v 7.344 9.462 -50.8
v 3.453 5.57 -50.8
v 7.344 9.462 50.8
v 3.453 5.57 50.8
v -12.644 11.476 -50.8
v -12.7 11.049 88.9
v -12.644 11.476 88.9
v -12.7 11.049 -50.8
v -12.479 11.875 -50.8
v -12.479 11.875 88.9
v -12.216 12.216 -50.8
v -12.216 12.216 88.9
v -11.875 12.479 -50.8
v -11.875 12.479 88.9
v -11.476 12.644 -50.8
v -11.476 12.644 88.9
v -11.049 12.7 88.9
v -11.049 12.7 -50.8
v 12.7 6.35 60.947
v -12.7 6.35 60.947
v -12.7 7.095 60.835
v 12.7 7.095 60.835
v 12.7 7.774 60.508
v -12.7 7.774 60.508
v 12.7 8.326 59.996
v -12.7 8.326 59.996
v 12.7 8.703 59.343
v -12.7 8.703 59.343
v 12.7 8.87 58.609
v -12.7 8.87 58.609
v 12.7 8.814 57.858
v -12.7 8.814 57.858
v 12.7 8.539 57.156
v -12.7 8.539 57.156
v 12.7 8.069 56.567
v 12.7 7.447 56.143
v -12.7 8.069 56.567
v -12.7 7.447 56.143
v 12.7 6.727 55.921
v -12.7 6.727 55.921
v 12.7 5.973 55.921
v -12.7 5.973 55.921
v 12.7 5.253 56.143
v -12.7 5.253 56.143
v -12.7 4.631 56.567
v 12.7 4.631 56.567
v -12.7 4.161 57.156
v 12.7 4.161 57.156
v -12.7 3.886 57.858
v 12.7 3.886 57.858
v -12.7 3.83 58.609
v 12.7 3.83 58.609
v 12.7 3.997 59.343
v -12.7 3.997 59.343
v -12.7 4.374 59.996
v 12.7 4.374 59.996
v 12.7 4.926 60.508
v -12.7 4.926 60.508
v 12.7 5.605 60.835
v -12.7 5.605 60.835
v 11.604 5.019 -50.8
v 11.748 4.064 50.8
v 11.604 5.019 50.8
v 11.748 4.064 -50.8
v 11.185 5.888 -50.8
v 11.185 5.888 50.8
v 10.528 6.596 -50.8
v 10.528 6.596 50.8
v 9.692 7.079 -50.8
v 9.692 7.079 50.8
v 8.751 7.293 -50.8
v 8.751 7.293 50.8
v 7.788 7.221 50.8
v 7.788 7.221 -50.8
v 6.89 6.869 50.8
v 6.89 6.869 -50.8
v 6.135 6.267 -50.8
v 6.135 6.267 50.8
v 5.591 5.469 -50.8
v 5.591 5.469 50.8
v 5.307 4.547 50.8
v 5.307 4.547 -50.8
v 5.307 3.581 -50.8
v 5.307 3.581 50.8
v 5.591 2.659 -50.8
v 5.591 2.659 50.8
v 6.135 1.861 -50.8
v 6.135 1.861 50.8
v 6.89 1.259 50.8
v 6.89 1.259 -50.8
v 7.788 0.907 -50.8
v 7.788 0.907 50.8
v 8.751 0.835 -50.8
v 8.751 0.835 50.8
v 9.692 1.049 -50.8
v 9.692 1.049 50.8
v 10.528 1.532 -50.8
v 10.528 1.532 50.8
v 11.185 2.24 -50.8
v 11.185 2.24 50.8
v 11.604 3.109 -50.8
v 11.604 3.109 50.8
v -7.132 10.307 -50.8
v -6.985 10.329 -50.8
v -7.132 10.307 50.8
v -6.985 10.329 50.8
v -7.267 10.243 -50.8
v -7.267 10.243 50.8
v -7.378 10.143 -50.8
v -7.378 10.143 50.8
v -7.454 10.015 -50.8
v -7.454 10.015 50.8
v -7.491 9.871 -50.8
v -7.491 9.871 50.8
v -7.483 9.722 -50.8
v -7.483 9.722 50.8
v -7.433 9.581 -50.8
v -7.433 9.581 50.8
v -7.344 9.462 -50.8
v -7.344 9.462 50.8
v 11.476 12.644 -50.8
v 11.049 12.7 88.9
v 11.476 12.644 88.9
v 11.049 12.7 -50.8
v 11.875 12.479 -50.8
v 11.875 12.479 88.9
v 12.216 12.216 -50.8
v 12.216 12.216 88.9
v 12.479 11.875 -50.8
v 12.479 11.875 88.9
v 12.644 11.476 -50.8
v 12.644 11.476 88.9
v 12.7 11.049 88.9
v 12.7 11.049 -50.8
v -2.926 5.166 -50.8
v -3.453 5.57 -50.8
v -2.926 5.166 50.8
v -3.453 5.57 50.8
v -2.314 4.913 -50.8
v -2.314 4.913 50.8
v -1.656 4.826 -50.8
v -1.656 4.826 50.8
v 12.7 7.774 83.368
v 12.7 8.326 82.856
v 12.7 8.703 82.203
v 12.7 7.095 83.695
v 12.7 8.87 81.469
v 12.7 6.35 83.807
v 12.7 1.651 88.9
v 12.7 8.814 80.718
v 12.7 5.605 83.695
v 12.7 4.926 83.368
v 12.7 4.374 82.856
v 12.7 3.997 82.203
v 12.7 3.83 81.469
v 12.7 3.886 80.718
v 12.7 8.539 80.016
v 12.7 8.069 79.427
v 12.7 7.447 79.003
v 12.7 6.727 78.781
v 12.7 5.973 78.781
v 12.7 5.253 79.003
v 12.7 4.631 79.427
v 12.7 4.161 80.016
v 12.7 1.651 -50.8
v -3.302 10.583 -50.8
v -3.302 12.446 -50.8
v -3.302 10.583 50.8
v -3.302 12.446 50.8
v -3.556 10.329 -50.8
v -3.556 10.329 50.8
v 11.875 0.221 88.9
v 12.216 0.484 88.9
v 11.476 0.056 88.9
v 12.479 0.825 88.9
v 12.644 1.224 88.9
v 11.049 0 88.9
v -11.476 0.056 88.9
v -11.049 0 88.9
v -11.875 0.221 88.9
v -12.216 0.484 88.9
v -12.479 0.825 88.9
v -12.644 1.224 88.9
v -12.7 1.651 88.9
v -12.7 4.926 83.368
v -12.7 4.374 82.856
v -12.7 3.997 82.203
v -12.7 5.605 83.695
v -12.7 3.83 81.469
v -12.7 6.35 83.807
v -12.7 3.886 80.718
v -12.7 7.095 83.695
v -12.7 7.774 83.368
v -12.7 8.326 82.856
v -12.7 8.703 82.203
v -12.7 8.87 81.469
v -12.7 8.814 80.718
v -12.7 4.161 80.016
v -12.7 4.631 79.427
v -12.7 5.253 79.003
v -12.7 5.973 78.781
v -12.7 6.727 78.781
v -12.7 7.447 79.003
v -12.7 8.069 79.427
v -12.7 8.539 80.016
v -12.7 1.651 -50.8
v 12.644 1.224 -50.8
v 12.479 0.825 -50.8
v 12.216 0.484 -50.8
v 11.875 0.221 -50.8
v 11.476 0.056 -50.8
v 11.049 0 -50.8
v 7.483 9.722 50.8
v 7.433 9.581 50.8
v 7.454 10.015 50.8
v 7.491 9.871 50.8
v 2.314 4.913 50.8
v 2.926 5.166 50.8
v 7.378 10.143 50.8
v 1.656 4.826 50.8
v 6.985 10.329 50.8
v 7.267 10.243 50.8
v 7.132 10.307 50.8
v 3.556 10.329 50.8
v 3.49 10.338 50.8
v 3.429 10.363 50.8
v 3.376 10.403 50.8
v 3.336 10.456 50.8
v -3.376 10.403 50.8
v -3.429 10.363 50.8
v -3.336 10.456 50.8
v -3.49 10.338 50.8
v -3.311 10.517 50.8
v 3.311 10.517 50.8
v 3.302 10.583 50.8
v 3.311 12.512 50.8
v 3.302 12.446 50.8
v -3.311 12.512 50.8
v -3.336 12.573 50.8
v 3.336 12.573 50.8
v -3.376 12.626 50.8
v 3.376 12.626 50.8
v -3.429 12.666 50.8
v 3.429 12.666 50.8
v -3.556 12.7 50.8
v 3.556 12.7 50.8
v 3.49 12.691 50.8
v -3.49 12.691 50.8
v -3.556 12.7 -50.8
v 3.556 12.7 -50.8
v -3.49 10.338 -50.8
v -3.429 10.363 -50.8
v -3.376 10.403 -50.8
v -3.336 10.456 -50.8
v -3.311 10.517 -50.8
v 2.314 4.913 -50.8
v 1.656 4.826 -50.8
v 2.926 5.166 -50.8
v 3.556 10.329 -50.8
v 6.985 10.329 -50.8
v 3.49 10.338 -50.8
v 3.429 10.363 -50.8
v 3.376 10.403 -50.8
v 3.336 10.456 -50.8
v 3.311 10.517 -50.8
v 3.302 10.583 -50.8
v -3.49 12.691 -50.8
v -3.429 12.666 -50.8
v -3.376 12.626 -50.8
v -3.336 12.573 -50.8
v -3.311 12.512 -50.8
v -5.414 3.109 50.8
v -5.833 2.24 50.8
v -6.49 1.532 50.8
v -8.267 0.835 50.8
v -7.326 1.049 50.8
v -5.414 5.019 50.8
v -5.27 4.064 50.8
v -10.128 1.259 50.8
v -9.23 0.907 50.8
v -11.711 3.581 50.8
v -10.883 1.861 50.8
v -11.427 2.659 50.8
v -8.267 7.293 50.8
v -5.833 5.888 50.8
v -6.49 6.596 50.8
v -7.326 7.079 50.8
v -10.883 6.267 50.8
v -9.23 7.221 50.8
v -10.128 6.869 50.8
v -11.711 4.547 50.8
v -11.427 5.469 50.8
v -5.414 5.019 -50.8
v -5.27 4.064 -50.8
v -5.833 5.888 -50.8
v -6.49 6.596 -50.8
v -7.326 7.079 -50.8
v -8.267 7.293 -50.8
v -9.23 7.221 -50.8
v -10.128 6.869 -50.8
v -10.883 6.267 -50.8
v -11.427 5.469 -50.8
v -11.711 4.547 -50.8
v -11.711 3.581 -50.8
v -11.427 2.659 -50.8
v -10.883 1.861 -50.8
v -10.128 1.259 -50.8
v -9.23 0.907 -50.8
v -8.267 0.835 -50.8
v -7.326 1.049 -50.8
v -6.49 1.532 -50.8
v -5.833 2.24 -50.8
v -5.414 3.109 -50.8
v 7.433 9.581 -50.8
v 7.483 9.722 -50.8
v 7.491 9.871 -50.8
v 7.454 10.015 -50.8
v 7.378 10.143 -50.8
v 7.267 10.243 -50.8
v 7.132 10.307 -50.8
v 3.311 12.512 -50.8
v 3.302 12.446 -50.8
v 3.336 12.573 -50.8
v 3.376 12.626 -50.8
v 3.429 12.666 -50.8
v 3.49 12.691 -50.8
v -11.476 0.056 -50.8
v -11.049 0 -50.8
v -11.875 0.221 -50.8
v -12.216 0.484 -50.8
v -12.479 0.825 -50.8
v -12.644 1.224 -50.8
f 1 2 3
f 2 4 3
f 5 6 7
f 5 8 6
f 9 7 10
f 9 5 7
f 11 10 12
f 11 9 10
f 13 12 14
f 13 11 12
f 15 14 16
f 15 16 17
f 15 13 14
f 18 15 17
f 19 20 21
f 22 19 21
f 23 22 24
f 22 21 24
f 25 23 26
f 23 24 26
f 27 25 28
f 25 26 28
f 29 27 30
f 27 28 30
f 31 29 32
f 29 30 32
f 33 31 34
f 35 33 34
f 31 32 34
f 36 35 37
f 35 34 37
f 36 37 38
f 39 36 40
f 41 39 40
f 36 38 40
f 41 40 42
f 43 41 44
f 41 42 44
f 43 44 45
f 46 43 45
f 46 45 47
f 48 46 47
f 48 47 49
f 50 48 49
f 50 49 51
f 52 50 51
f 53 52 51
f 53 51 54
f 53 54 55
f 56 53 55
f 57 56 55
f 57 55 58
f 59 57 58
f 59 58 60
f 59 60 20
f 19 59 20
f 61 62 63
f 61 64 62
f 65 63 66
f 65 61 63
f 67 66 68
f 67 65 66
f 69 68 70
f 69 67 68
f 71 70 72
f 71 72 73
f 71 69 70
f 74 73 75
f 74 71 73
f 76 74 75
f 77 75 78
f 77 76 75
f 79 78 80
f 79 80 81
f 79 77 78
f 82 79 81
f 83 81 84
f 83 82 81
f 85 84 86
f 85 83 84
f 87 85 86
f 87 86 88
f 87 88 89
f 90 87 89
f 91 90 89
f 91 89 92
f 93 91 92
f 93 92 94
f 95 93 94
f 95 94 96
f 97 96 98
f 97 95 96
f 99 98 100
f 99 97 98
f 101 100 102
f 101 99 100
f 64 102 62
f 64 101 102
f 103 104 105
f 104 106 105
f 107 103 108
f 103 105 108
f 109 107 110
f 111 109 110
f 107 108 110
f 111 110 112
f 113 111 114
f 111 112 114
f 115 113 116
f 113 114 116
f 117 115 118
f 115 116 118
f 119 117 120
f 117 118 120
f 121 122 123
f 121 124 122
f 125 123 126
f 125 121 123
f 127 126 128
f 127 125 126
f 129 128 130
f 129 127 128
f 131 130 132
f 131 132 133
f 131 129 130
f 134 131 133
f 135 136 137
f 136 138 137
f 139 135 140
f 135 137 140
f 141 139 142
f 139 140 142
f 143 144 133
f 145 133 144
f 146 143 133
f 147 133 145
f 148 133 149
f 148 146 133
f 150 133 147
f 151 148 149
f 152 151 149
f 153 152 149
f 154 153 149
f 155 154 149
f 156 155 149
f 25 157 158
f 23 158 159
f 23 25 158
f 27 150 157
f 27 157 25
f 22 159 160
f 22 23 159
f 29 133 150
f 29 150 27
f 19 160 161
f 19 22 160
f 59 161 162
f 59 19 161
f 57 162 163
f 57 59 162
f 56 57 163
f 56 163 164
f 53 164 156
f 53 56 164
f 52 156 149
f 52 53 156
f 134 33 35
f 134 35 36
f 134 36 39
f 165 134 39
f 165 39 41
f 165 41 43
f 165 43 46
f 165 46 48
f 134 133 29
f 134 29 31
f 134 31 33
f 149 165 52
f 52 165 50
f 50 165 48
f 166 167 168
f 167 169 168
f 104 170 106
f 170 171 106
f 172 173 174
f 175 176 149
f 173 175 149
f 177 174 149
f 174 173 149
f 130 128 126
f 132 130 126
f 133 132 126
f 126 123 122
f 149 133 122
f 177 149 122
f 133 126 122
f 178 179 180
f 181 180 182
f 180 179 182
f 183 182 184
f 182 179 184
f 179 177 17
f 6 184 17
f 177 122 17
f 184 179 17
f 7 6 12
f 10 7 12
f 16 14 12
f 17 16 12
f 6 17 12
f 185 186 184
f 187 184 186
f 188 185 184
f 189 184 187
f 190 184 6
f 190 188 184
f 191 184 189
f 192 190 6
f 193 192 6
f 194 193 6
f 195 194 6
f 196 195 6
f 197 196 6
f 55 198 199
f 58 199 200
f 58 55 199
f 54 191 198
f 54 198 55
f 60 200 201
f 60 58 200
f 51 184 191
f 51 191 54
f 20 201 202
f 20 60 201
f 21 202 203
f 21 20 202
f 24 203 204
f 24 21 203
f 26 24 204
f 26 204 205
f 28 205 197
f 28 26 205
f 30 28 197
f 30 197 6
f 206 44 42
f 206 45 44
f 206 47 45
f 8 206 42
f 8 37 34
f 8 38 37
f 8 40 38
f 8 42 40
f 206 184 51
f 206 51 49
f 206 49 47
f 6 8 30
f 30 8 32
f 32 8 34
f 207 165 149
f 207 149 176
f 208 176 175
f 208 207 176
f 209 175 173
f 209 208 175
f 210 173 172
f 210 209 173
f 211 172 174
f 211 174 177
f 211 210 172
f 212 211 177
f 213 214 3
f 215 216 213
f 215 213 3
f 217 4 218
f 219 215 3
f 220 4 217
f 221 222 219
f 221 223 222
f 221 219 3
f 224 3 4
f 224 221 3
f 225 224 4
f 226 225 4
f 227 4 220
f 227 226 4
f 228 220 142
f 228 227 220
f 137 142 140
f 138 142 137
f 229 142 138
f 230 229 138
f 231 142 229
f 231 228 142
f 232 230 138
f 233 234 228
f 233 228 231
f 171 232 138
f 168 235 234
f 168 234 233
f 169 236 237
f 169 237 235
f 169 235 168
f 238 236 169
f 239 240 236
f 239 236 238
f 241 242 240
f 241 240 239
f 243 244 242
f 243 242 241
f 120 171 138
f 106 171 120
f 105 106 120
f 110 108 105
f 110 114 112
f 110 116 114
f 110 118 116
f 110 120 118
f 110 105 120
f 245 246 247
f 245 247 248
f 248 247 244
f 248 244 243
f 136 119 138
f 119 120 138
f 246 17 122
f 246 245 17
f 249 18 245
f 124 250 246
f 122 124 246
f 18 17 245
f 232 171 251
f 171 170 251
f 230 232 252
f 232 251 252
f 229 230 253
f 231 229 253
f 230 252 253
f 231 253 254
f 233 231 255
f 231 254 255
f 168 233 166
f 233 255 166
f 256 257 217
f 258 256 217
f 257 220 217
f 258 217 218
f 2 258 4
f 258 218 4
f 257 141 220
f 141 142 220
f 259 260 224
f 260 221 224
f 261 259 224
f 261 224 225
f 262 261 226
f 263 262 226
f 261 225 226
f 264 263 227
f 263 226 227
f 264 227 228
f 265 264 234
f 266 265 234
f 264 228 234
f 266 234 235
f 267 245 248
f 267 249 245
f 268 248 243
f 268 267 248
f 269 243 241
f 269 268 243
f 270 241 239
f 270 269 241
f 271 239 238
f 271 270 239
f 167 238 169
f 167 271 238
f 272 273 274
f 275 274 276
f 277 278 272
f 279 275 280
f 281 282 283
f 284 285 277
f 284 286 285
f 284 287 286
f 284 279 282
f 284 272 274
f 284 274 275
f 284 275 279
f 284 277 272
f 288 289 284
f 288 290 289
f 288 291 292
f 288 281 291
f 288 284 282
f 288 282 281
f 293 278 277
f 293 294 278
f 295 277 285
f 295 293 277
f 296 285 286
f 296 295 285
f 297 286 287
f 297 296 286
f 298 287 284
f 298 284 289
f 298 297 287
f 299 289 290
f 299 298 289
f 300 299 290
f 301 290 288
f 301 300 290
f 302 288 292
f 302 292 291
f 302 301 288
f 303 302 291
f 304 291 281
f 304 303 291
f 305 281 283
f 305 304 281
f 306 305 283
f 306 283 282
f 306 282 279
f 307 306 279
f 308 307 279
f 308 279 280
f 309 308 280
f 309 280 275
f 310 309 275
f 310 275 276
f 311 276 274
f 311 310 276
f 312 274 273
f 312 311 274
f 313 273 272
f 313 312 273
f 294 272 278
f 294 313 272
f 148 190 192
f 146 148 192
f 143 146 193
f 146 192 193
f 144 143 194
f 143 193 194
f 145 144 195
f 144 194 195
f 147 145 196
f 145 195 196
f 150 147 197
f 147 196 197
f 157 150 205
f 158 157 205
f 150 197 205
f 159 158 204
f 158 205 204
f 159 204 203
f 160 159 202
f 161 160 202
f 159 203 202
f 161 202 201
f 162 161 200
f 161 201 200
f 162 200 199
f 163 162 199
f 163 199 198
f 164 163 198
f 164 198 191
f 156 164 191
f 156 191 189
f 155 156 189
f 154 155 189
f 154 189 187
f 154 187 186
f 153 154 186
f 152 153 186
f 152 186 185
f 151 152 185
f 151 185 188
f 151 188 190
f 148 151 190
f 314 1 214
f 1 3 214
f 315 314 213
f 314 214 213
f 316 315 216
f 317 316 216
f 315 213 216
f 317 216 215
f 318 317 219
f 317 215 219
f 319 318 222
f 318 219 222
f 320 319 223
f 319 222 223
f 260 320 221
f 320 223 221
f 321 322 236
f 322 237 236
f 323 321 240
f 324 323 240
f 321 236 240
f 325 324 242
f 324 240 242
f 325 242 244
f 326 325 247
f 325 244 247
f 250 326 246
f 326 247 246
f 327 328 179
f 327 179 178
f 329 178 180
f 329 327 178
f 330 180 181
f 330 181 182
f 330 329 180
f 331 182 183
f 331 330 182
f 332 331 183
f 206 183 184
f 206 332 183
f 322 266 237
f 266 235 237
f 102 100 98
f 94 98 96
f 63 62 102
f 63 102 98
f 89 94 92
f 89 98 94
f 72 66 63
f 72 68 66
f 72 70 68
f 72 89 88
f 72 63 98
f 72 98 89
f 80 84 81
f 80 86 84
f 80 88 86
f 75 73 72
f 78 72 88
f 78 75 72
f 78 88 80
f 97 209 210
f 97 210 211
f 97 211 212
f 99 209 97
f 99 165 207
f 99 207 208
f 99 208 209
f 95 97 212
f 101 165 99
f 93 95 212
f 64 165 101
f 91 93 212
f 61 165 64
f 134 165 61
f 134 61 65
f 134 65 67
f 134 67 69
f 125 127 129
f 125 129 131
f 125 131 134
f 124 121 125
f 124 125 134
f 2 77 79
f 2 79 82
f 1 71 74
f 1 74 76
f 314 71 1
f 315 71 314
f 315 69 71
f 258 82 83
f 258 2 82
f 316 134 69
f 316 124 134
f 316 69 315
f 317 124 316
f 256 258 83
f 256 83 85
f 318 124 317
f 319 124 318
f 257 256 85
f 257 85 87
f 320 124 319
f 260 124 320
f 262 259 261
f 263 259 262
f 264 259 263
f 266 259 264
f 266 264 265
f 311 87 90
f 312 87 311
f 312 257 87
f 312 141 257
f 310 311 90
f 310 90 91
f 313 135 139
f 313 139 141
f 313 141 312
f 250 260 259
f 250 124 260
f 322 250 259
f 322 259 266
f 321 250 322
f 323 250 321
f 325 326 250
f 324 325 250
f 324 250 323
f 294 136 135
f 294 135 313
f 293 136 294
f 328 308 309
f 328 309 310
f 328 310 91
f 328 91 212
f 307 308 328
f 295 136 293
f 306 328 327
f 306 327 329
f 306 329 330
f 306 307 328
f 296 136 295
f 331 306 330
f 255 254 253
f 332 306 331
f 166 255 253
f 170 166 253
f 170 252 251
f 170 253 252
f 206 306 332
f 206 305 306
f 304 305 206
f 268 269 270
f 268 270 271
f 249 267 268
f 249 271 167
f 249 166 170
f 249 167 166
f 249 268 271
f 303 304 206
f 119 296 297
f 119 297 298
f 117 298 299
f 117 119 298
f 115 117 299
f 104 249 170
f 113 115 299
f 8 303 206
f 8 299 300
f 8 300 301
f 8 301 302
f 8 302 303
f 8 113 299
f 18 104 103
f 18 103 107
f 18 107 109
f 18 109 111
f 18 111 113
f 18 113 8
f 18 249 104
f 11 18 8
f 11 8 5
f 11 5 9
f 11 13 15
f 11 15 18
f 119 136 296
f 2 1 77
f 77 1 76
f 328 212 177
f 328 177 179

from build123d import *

# Parameters (mm, degrees)
SKETCH3_R                  = 3.2385
BOSS_EXTRUDE1_DEPTH        = 50.8
FILLET1_R                  = 0.254
BOSS_EXTRUDE2_DEPTH        = 38.1
F_8_0_199_DIAMETER_HOLE1_D = 5.0546
LPATTERN1_COUNT            = 2
LPATTERN1_PITCH            = 22.86


with BuildPart() as part:
    # Sketch3 → Boss-Extrude1 (new body, symmetric)
    with BuildSketch(Plane.XY):
        with BuildLine():
            Line((-11.049, 12.7), (-3.302, 12.7))
            Line((-3.302, 12.7), (-3.302, 10.328863887))
            Line((-3.302, 10.328863887), (-6.985, 10.328863887))
            ThreePointArc((-6.985, 10.328863887), (-7.454330803, 10.01526707), (-7.344210245, 9.461653642))
            Line((-7.344210245, 9.461653642), (-3.452505379, 5.569948776))
            ThreePointArc((-3.452505379, 5.569948776), (-2.628470073, 5.019345987), (-1.656454155, 4.826))
            Line((-1.656454155, 4.826), (1.656454155, 4.826))
            ThreePointArc((1.656454155, 4.826), (2.628470073, 5.019345987), (3.452505379, 5.569948776))
            Line((3.452505379, 5.569948776), (7.344210245, 9.461653642))
            ThreePointArc((7.344210245, 9.461653642), (7.454330803, 10.01526707), (6.985, 10.328863887))
            Line((6.985, 10.328863887), (3.302, 10.328863887))
            Line((3.302, 10.328863887), (3.302, 12.7))
            Line((3.302, 12.7), (11.049, 12.7))
            ThreePointArc((11.049, 12.7), (12.216433296, 12.216433296), (12.7, 11.049))
            Line((12.7, 11.049), (12.7, 1.651))
            ThreePointArc((12.7, 1.651), (12.216433296, 0.483566704), (11.049, 0))
            Line((11.049, 0), (-11.049, 0))
            ThreePointArc((-11.049, 0), (-12.216433296, 0.483566704), (-12.7, 1.651))
            Line((-12.7, 1.651), (-12.7, 11.049))
            ThreePointArc((-12.7, 11.049), (-12.216433296, 12.216433296), (-11.049, 12.7))
        make_face()
        with Locations((8.509, 4.064)):
            Circle(SKETCH3_R, mode=Mode.SUBTRACT)
        with Locations((-8.509, 4.064)):
            Circle(SKETCH3_R, mode=Mode.SUBTRACT)
    extrude(amount=BOSS_EXTRUDE1_DEPTH, both=True)

    # Fillet1
    fillet1_edges = [part.edges().sort_by_distance(p)[0] for p in [
        (-3.302, 12.7, 0),
        (-3.302, 10.328863887, 0),
        (3.302, 10.328863887, 0),
        (3.302, 12.7, 0),
    ]]
    fillet(fillet1_edges, radius=FILLET1_R)

    # Sketch4 → Boss-Extrude2 (add)
    with BuildSketch(Plane(origin=(0, 0, 50.8), x_dir=(-1, 0, 0), z_dir=(0, 0, -1))):
        with BuildLine():
            Line((3.556, 12.7), (-11.049, 12.7))
            ThreePointArc((-11.049, 12.7), (-12.216433296, 12.216433296), (-12.7, 11.049))
            Line((-12.7, 11.049), (-12.7, 1.651))
            ThreePointArc((-12.7, 1.651), (-12.216433296, 0.483566704), (-11.049, 0))
            Line((-11.049, 0), (11.049, 0))
            ThreePointArc((11.049, 0), (12.216433296, 0.483566704), (12.7, 1.651))
            Line((12.7, 1.651), (12.7, 11.049))
            ThreePointArc((12.7, 11.049), (12.216433296, 12.216433296), (11.049, 12.7))
            Line((11.049, 12.7), (3.556, 12.7))
        make_face()
    extrude(amount=-BOSS_EXTRUDE2_DEPTH)

    # #8 (0.199) Diameter Hole1 (through all)
    with Locations(Plane(origin=(12.7, 0, 0), x_dir=(0, 0, -1), z_dir=(1, 0, 0))):
        with Locations((-81.28, 6.35)):
            f_8_0_199_diameter_hole1 = Hole(F_8_0_199_DIAMETER_HOLE1_D / 2)

    # LPattern1: #8 (0.199) Diameter Hole1 ×2
    with Locations(*[(0, 0, -i * LPATTERN1_PITCH) for i in range(1, LPATTERN1_COUNT)]):
        add(f_8_0_199_diameter_hole1, mode=Mode.SUBTRACT)


solid = part.part
